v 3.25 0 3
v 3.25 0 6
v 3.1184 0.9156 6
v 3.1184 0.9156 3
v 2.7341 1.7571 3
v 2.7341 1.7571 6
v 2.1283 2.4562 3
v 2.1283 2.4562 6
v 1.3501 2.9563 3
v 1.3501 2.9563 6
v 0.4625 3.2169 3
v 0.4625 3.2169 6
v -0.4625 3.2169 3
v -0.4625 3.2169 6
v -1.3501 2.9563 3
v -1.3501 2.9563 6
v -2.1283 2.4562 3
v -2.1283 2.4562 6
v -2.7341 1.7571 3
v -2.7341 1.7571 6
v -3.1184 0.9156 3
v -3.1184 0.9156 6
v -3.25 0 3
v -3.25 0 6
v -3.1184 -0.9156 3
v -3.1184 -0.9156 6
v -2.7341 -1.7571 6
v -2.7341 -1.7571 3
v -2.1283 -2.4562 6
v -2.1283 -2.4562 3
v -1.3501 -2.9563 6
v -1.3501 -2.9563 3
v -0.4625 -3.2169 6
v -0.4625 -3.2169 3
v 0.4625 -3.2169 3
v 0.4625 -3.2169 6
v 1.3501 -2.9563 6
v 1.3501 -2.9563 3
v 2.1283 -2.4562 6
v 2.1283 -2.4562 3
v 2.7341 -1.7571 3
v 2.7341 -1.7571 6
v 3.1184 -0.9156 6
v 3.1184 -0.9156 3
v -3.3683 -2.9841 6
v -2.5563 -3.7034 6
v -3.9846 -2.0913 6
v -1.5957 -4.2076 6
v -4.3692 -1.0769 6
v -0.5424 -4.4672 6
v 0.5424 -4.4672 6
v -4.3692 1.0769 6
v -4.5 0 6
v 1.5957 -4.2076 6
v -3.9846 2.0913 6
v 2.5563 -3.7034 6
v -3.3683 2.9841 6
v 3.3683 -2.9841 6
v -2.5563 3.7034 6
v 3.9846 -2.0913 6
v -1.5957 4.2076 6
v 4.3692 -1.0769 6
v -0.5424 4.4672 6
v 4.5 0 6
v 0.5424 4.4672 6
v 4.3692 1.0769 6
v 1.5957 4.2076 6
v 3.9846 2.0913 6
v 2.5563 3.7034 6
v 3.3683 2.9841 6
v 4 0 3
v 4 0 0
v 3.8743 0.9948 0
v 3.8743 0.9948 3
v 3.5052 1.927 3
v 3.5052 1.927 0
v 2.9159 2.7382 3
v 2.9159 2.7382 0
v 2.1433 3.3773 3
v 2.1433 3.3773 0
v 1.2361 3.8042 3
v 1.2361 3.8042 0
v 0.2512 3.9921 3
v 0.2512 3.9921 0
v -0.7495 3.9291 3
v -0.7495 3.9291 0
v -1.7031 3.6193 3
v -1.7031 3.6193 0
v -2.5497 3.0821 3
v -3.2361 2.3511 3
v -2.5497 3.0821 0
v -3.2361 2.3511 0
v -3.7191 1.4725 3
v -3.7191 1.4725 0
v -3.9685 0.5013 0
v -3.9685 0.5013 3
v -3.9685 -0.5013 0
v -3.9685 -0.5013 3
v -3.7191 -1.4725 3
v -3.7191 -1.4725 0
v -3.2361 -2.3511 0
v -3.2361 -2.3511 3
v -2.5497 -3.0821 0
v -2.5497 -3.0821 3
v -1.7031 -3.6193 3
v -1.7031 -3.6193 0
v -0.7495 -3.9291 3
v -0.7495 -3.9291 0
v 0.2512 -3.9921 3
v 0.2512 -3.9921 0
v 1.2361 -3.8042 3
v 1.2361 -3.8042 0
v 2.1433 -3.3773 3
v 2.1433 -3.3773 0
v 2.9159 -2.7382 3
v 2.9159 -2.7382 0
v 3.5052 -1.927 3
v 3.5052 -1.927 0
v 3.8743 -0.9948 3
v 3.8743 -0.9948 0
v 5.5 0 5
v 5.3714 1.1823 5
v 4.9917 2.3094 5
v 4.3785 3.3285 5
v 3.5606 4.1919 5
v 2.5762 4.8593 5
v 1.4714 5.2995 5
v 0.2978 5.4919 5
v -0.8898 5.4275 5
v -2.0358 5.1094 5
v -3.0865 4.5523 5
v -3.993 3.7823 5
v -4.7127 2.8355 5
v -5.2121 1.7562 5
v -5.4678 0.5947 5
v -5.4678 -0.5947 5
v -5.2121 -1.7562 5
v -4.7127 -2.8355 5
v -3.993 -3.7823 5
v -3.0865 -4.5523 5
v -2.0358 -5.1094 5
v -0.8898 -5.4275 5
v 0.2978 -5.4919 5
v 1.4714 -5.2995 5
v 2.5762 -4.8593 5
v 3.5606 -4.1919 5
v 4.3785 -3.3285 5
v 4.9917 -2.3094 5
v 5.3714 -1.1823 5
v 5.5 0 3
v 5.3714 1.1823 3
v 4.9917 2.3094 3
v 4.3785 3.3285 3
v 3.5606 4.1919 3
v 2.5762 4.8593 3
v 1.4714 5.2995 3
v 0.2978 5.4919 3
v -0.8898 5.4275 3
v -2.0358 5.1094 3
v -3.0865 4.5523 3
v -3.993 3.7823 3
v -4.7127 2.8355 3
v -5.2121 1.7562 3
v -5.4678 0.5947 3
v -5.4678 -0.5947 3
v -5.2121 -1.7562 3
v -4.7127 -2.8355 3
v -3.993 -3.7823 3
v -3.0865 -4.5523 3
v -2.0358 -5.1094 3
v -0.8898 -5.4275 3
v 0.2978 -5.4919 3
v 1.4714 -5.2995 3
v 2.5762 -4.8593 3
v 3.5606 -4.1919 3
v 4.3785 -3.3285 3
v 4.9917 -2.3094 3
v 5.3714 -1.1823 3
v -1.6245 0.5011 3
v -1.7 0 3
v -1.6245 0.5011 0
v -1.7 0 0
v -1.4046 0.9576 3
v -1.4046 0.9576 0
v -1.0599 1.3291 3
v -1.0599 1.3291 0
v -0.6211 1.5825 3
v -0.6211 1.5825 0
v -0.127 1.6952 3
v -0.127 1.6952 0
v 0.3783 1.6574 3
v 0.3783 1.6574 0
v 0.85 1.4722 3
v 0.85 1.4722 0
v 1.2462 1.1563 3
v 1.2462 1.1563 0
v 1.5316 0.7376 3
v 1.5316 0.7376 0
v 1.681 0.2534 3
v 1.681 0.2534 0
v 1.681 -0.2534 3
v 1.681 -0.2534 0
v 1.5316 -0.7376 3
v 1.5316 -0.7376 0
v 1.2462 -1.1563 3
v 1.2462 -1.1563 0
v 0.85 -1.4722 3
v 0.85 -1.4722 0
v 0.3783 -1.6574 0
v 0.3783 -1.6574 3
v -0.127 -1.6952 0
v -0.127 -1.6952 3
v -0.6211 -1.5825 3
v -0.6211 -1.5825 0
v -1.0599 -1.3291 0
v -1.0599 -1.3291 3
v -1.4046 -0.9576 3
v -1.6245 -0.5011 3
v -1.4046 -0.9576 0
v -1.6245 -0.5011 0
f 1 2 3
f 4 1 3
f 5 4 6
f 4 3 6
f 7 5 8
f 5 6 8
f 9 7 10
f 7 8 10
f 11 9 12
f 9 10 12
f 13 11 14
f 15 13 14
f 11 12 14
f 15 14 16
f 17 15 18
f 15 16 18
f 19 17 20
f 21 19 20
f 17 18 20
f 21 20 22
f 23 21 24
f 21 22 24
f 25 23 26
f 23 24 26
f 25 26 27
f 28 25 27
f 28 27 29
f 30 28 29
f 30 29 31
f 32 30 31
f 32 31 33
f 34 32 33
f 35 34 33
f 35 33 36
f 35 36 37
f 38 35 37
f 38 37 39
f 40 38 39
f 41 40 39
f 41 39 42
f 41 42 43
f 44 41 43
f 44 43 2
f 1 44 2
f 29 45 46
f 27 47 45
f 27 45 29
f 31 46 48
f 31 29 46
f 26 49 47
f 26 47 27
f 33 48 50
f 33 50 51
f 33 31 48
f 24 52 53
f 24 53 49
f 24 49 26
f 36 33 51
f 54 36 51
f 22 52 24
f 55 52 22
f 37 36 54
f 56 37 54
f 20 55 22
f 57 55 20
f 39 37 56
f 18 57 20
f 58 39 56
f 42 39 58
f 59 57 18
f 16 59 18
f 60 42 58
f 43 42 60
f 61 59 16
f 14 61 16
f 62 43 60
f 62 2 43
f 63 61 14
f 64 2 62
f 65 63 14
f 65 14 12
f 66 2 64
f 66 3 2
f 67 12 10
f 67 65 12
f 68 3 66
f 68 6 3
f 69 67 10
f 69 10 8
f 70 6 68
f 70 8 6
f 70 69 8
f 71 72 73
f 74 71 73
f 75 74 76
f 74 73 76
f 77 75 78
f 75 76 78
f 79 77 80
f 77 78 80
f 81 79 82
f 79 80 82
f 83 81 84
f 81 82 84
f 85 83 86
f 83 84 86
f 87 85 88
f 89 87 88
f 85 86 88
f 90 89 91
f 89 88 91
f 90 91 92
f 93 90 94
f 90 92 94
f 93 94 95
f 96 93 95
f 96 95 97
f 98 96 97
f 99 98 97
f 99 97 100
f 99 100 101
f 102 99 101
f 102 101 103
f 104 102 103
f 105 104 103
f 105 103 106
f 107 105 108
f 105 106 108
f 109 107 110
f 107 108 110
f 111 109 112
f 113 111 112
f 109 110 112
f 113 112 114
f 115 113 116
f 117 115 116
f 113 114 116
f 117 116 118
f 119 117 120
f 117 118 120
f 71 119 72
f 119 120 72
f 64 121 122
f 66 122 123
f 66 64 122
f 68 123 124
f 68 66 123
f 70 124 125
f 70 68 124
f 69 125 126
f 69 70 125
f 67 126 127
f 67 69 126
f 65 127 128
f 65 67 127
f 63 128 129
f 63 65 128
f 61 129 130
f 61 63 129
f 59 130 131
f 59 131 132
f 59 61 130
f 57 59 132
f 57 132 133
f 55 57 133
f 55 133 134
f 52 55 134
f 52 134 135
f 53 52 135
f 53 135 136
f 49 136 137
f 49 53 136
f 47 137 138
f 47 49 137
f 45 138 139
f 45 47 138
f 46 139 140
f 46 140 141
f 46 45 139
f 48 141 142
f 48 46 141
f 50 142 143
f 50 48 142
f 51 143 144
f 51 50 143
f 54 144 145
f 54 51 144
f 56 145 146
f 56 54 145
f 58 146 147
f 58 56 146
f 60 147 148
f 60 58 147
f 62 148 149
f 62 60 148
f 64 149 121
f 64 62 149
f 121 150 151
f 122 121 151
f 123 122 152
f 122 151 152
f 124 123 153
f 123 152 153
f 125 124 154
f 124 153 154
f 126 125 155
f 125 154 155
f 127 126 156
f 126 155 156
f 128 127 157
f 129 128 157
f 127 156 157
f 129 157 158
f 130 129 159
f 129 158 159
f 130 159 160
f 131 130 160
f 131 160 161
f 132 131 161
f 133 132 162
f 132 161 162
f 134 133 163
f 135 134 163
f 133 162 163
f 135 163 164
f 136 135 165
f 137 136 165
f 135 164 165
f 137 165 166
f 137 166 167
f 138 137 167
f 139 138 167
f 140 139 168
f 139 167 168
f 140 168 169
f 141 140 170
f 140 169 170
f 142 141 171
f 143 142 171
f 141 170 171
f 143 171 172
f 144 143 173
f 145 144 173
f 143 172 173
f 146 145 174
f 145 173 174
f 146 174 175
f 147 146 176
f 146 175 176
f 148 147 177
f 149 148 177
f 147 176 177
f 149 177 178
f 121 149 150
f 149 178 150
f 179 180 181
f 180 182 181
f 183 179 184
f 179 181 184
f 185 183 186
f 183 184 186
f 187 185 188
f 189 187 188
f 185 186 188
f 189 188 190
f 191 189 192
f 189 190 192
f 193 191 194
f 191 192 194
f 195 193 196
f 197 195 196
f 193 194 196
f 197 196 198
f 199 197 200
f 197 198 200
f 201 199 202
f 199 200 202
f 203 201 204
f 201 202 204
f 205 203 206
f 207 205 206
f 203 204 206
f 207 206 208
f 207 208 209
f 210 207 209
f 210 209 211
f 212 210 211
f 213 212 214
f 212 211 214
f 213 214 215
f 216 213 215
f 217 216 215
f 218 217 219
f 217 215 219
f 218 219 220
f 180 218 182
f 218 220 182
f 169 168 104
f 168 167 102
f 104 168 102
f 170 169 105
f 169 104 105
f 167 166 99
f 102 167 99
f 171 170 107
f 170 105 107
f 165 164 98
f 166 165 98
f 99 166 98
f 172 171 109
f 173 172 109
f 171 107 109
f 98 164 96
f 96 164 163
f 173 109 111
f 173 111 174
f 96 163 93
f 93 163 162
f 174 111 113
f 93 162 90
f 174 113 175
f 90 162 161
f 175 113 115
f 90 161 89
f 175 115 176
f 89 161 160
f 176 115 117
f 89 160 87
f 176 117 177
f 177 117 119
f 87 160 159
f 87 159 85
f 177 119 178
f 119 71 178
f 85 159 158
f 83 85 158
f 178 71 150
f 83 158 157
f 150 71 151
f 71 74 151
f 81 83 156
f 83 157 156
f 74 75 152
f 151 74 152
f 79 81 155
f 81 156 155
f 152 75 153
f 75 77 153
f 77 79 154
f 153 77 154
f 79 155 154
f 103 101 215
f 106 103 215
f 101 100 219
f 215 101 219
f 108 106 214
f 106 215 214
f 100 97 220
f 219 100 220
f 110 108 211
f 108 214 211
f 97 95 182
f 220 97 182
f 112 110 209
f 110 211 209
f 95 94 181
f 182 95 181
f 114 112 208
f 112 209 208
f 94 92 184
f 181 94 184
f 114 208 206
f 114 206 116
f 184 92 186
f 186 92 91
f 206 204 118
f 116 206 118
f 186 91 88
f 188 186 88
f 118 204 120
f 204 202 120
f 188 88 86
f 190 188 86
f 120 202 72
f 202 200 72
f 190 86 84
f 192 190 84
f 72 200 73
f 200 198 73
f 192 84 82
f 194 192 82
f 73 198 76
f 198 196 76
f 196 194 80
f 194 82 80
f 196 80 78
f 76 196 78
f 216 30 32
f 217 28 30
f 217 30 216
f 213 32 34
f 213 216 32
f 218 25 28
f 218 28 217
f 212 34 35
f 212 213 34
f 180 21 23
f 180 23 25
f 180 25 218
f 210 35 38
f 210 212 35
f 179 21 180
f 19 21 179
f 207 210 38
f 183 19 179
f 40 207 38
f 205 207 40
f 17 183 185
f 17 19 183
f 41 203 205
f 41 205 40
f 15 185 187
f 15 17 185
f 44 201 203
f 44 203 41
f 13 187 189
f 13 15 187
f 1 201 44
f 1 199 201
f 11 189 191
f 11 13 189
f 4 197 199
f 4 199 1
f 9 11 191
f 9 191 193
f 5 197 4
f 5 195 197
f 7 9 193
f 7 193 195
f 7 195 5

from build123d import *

# Parameters (mm, degrees)
SKETCH1_R                      = 4
BOSS_EXTRUDE1_DEPTH            = 3
SKETCH2_R                      = 5.5
BOSS_EXTRUDE2_DEPTH            = 3
CBORE_FOR_M3_SHCS1_D           = 3.4
CBORE_FOR_M3_SHCS1_CBORE_D     = 6.5
CBORE_FOR_M3_SHCS1_CBORE_DEPTH = 3
CHAMFER1_SIZE                  = 1


with BuildPart() as part:
    # Sketch1 → Boss-Extrude1 (new body)
    with BuildSketch(Plane.XY):
        Circle(SKETCH1_R)
    extrude(amount=BOSS_EXTRUDE1_DEPTH)

    # Sketch2 → Boss-Extrude2 (add)
    with BuildSketch(Plane.XY.offset(3)):
        Circle(SKETCH2_R)
    extrude(amount=BOSS_EXTRUDE2_DEPTH)

    # CBORE for M3 SHCS1 (through all)
    with Locations(Plane.XY.offset(6)):
        with Locations((0, 0)):
            CounterBoreHole(CBORE_FOR_M3_SHCS1_D / 2, CBORE_FOR_M3_SHCS1_CBORE_D / 2, CBORE_FOR_M3_SHCS1_CBORE_DEPTH)

    # Chamfer1
    chamfer1_edges = [part.edges().sort_by_distance(p)[0] for p in [
        (-5.5, 0, 6),
    ]]
    chamfer(chamfer1_edges, length=CHAMFER1_SIZE)


solid = part.part
